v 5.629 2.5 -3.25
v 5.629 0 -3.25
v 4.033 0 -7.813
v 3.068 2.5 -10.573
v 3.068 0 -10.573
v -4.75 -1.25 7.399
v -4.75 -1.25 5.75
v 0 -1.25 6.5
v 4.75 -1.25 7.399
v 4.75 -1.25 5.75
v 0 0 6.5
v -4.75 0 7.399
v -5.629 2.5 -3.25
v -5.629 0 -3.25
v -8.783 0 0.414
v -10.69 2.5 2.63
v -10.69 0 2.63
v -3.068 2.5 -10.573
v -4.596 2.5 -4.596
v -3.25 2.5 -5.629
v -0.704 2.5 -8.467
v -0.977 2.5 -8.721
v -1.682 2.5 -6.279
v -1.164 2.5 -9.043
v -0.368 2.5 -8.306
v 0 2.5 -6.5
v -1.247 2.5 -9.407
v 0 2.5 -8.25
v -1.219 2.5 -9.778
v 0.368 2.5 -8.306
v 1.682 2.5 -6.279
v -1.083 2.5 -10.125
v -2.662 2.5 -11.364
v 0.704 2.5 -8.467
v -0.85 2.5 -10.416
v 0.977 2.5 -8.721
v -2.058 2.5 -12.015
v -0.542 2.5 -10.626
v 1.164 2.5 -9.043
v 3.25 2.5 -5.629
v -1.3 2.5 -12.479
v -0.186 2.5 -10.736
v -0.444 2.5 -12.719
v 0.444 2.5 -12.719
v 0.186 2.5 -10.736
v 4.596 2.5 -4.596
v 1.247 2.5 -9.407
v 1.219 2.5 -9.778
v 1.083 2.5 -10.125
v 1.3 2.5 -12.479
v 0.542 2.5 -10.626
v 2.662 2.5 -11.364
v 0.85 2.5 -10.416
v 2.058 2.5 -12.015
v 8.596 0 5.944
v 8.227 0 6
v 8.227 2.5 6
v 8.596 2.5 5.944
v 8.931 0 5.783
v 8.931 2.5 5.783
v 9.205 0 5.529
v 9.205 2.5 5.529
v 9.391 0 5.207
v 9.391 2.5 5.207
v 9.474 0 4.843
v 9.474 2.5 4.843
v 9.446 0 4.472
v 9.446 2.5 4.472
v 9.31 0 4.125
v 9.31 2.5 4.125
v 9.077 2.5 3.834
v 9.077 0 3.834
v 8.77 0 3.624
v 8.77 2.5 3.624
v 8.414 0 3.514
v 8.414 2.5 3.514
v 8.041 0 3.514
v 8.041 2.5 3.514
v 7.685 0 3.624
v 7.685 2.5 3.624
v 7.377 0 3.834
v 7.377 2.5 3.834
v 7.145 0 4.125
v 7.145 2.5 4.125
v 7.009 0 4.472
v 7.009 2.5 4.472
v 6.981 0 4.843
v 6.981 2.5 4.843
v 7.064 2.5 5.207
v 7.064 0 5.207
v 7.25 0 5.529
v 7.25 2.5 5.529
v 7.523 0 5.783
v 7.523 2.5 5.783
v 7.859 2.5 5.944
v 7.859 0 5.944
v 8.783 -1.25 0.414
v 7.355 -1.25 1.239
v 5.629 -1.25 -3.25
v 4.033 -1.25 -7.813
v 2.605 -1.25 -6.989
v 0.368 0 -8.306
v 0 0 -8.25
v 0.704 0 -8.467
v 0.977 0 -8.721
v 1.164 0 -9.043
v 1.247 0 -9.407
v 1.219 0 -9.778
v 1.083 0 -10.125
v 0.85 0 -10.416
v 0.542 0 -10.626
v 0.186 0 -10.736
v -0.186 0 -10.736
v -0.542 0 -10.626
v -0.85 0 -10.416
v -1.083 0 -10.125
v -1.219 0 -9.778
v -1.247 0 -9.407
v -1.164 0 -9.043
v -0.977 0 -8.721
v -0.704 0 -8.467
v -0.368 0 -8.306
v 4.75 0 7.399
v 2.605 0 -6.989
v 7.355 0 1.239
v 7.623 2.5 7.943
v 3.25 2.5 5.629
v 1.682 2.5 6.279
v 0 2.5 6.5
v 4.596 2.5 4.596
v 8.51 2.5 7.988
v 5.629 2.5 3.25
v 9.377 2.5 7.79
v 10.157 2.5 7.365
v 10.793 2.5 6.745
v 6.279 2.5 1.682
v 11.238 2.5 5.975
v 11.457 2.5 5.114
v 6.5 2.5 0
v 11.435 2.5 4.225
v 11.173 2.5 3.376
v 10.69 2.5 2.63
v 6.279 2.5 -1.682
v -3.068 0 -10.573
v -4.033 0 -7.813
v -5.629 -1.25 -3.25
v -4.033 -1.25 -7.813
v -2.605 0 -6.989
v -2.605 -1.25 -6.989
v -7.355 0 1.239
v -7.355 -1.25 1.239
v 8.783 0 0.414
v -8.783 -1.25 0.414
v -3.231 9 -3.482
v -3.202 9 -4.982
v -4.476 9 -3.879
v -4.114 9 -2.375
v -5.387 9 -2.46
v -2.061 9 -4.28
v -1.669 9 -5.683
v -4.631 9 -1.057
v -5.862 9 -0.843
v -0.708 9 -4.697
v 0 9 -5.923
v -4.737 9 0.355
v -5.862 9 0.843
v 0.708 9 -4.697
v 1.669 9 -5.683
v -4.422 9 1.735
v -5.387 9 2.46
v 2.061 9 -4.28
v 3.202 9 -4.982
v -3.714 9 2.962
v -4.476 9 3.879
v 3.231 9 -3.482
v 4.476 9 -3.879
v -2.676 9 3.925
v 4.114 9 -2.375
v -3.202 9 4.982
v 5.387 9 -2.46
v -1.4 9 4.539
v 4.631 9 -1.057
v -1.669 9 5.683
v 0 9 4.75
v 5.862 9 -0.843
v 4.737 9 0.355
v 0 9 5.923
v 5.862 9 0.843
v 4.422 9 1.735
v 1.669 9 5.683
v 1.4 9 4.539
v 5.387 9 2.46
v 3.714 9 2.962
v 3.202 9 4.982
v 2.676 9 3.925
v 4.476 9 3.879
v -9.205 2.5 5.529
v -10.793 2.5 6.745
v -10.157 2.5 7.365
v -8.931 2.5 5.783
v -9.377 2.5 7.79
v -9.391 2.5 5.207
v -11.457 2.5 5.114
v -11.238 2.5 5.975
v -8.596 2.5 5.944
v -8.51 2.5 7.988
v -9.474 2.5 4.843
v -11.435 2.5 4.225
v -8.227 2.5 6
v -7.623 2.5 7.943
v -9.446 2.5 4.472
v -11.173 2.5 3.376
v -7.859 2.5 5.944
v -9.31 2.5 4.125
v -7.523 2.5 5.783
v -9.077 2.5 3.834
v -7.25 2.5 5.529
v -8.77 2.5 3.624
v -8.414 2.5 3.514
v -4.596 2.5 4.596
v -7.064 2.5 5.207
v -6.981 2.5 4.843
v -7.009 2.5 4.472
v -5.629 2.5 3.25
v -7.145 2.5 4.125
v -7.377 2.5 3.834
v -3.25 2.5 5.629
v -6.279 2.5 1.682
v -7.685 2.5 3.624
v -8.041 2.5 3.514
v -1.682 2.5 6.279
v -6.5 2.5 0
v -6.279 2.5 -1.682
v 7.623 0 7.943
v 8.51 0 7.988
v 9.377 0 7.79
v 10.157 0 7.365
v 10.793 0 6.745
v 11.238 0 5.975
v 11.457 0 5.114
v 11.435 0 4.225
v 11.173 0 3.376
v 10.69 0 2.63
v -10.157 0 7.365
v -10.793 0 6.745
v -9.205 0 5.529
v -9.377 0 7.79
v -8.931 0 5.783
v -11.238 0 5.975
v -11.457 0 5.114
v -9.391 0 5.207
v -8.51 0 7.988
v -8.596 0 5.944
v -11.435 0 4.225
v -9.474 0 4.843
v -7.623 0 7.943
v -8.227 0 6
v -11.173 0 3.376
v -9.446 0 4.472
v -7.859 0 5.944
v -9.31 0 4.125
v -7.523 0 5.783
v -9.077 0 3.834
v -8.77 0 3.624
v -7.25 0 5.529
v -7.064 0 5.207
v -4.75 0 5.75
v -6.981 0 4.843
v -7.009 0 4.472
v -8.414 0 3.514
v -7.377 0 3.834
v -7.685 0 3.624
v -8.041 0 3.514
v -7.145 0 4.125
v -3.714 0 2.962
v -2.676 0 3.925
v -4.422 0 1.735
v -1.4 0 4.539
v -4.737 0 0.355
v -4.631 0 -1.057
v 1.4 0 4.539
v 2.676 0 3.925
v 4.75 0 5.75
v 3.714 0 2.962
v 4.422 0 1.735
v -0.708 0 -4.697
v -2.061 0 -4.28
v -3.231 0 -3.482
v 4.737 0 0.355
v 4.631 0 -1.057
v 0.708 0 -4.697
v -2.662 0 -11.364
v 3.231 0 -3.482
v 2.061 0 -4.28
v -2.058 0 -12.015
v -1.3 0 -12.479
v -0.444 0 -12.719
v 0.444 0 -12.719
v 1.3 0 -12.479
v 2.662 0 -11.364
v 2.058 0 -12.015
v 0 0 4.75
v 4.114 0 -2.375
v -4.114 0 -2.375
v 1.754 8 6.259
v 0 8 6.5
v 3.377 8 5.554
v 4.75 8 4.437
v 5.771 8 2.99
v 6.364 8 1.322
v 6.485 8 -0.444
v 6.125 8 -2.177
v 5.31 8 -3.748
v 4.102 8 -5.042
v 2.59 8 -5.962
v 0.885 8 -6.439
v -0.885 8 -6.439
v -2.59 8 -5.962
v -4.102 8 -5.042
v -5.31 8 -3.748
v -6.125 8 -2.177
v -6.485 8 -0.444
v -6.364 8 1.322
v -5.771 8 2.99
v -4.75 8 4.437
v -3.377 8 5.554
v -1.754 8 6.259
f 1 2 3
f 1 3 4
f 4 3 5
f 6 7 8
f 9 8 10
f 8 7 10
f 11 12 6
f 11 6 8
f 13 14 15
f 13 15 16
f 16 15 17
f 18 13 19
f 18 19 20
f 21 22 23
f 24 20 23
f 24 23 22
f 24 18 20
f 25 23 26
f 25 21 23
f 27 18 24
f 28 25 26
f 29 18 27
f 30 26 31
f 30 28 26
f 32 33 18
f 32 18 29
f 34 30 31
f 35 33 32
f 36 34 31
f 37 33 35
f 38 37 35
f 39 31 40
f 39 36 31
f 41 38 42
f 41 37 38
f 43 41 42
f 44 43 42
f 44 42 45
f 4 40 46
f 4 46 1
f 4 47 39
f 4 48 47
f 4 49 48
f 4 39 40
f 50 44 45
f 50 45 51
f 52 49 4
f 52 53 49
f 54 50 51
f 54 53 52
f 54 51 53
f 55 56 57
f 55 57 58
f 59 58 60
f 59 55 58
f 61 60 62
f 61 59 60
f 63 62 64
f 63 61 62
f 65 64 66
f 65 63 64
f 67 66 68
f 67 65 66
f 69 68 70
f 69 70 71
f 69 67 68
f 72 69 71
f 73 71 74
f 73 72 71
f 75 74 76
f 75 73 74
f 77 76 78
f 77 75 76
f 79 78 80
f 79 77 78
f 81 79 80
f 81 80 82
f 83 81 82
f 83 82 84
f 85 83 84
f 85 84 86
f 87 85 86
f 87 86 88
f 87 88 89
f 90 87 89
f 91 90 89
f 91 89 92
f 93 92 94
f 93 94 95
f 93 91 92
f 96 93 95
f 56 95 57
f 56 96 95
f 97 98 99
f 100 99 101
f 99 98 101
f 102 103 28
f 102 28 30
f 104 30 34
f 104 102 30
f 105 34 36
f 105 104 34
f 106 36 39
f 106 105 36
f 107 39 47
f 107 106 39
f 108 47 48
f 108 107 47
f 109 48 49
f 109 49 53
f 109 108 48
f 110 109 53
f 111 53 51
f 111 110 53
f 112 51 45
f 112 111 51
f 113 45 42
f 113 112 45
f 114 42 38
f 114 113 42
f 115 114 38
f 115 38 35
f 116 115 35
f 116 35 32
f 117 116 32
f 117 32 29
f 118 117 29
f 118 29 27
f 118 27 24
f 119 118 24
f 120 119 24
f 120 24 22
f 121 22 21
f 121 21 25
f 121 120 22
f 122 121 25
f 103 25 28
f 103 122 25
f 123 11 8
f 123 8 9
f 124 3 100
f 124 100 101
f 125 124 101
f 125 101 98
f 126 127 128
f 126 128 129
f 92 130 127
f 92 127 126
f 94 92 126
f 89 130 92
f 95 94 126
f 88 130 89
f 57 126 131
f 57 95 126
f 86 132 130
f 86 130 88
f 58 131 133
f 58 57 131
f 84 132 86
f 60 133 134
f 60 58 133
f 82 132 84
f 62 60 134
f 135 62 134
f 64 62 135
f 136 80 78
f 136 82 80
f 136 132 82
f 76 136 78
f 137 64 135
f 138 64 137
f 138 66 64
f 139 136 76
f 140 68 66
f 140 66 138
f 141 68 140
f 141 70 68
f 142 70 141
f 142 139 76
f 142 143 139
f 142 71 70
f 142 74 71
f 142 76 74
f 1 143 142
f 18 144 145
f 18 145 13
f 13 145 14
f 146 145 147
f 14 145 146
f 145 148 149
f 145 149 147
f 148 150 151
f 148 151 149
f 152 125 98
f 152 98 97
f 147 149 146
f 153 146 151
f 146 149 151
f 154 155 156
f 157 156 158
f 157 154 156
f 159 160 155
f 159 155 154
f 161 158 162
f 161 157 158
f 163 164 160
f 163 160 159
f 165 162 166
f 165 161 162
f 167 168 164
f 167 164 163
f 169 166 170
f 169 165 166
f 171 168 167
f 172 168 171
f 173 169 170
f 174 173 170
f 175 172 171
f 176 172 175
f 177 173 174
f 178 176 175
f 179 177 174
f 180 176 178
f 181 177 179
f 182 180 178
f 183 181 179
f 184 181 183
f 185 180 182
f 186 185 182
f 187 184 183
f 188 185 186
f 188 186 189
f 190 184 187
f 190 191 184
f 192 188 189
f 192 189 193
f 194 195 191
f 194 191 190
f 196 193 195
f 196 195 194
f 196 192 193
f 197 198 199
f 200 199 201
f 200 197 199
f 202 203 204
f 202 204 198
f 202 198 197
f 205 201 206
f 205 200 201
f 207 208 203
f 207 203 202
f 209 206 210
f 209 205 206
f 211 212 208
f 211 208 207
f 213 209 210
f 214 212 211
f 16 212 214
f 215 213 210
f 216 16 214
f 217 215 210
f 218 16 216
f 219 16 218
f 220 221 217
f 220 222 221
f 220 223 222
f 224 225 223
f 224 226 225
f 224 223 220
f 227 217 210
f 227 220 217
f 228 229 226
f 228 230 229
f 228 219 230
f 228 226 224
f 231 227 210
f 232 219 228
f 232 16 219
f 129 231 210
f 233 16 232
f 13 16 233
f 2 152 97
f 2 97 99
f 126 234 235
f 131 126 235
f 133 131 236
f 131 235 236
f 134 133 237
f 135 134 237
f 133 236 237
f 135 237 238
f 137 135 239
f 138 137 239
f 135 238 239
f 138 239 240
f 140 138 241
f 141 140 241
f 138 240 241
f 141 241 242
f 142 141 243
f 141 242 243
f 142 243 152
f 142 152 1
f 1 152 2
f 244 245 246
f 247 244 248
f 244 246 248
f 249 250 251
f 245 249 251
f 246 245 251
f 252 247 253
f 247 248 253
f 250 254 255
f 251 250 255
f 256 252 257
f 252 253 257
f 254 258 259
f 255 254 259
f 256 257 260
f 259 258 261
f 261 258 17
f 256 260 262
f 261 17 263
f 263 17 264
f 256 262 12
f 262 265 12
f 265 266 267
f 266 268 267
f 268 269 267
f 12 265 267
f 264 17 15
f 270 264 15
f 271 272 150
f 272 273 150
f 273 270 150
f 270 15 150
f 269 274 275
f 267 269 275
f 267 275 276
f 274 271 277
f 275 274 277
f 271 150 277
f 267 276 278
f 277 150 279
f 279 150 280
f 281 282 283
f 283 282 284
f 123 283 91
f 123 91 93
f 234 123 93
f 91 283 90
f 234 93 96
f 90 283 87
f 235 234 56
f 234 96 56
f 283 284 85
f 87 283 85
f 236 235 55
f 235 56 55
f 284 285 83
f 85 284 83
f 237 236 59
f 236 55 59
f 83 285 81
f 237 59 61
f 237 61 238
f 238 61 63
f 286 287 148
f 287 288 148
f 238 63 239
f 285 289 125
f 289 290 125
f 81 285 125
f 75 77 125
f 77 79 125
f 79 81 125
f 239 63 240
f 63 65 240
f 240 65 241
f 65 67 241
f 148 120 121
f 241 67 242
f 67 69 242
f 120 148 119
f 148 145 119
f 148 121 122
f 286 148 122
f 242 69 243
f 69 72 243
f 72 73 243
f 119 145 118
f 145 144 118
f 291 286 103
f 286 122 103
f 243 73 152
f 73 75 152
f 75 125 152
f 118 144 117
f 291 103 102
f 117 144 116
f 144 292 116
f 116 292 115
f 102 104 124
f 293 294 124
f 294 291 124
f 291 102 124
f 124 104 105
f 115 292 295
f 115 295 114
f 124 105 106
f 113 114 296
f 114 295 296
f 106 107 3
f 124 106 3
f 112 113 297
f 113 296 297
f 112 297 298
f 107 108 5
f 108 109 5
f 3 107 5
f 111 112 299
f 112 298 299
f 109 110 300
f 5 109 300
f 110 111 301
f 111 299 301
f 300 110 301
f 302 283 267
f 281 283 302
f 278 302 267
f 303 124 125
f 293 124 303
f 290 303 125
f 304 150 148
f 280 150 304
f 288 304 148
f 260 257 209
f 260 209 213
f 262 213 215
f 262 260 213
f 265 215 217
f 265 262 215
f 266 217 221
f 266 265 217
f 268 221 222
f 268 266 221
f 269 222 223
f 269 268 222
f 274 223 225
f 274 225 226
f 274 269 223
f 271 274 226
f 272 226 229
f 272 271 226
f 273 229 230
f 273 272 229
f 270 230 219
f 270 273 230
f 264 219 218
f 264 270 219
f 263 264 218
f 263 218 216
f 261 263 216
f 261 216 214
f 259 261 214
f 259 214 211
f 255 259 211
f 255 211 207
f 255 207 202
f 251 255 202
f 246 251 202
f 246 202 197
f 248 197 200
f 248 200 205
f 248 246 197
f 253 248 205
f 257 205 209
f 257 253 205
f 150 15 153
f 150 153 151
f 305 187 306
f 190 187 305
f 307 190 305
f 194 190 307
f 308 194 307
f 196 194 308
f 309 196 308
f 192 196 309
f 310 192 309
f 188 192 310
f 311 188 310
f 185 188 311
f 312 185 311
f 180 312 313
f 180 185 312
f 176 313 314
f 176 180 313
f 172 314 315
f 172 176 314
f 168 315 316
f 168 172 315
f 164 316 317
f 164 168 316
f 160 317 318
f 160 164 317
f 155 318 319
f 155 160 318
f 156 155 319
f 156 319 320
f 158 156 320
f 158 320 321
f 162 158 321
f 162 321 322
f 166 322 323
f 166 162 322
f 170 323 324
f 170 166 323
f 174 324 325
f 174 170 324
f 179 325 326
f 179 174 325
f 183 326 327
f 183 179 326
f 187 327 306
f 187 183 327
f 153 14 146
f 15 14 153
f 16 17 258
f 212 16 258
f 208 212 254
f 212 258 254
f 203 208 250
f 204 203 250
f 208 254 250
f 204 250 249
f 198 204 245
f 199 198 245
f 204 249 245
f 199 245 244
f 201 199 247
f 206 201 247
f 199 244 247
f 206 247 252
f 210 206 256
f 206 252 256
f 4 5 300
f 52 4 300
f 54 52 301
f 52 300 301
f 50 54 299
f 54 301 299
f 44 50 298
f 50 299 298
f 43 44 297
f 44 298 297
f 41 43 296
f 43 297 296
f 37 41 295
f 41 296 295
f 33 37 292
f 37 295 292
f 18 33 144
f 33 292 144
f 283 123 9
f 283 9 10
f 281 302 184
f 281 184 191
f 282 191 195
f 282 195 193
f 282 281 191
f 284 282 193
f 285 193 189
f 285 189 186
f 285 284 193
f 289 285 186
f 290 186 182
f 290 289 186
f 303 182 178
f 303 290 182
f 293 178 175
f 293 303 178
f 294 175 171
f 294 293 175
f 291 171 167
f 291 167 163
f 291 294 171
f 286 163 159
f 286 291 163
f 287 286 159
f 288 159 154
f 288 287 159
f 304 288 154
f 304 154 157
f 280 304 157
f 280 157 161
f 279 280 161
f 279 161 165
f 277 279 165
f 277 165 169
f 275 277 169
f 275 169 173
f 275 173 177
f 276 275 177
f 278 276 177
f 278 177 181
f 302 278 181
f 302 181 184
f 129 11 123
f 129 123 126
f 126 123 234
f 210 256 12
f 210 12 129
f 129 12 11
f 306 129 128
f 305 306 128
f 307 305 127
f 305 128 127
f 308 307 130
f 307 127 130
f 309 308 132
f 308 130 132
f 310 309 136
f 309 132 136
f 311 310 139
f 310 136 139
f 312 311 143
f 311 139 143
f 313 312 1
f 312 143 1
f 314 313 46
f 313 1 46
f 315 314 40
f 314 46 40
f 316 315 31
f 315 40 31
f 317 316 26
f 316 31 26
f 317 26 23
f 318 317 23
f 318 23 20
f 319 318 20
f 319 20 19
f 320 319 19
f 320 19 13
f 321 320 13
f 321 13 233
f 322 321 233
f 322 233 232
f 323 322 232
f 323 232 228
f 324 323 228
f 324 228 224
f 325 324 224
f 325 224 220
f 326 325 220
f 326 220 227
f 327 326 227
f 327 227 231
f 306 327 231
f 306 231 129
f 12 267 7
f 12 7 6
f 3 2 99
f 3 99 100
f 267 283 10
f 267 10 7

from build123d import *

# Parameters (mm, degrees)
SKETCH1_R           = 1.25
SKETCH1_R_2         = 4.75
BOSS_EXTRUDE1_DEPTH = 2.5
SKETCH1_9_R         = 6.5
SKETCH1_9_R_2       = 4.75
BOSS_EXTRUDE2_DEPTH = 9
CHAMFER1_SIZE       = 1
CHAMFER1_SIZE2      = 0.577350269
BOSS_EXTRUDE3_DEPTH = 1.25
CIRPATTERN1_COUNT   = 3


with BuildPart() as part:
    # Sketch1 → Boss-Extrude1 (new body)
    with BuildSketch(Plane(origin=(0, 0, 0), x_dir=(1, 0, 0), z_dir=(0, 1, 0))):
        with BuildLine():
            ThreePointArc((3.067754869, 10.573023795), (0, 12.75), (-3.067754869, 10.573023795))
            Line((-3.067754869, 10.573023795), (-5.629165125, 3.25))
            Line((-5.629165125, 3.25), (-10.690384636, -2.629758248))
            ThreePointArc((-10.690384636, -2.629758248), (-11.041823898, -6.375), (-7.622629767, -7.943265547))
            Line((-7.622629767, -7.943265547), (0, -6.5))
            Line((0, -6.5), (7.622629767, -7.943265547))
            ThreePointArc((7.622629767, -7.943265547), (11.041823898, -6.375), (10.690384636, -2.629758248))
            Line((10.690384636, -2.629758248), (5.629165125, 3.25))
            Line((5.629165125, 3.25), (3.067754869, 10.573023795))
        make_face()
        with Locations((0, 9.5)):
            Circle(SKETCH1_R, mode=Mode.SUBTRACT)
        Circle(SKETCH1_R_2, mode=Mode.SUBTRACT)
        with Locations((-8.227241336, -4.75)):
            Circle(SKETCH1_R, mode=Mode.SUBTRACT)
        with Locations((8.227241336, -4.75)):
            Circle(SKETCH1_R, mode=Mode.SUBTRACT)
    extrude(amount=BOSS_EXTRUDE1_DEPTH)

    # Sketch1<9> → Boss-Extrude2 (add)
    with BuildSketch(Plane(origin=(0, 0, 0), x_dir=(1, 0, 0), z_dir=(0, 1, 0))):
        Circle(SKETCH1_9_R)
        Circle(SKETCH1_9_R_2, mode=Mode.SUBTRACT)
    extrude(amount=BOSS_EXTRUDE2_DEPTH)

    # Chamfer1
    chamfer1_edges = [part.edges().sort_by_distance(p)[0] for p in [
        (-6.5, 9, 0),
    ]]
    chamfer1_side = [part.faces().sort_by_distance(p)[0] for p in [
        (-6.5, 5.75, 0),
    ]]
    chamfer(chamfer1_edges, length=CHAMFER1_SIZE, length2=CHAMFER1_SIZE2, reference=chamfer1_side[0])

    # Sketch1<10> → Boss-Extrude3 (add)
    with BuildSketch(Plane(origin=(0, 0, 0), x_dir=(1, 0, 0), z_dir=(0, 1, 0))):
        Polygon((-4.75, -7.399363022), (0, -6.5), (4.75, -7.399363022), (4.75, -5.75), (-4.75, -5.75), align=None)
    boss_extrude3 = extrude(amount=-BOSS_EXTRUDE3_DEPTH)

    # CirPattern1: Boss-Extrude3 ×3 about axis
    cirpattern1_axis = Axis((0, 2.5, 0), (0, -1, 0))
    for i in range(1, CIRPATTERN1_COUNT):
        add(boss_extrude3.rotate(cirpattern1_axis, i * 360 / CIRPATTERN1_COUNT))


solid = part.part
